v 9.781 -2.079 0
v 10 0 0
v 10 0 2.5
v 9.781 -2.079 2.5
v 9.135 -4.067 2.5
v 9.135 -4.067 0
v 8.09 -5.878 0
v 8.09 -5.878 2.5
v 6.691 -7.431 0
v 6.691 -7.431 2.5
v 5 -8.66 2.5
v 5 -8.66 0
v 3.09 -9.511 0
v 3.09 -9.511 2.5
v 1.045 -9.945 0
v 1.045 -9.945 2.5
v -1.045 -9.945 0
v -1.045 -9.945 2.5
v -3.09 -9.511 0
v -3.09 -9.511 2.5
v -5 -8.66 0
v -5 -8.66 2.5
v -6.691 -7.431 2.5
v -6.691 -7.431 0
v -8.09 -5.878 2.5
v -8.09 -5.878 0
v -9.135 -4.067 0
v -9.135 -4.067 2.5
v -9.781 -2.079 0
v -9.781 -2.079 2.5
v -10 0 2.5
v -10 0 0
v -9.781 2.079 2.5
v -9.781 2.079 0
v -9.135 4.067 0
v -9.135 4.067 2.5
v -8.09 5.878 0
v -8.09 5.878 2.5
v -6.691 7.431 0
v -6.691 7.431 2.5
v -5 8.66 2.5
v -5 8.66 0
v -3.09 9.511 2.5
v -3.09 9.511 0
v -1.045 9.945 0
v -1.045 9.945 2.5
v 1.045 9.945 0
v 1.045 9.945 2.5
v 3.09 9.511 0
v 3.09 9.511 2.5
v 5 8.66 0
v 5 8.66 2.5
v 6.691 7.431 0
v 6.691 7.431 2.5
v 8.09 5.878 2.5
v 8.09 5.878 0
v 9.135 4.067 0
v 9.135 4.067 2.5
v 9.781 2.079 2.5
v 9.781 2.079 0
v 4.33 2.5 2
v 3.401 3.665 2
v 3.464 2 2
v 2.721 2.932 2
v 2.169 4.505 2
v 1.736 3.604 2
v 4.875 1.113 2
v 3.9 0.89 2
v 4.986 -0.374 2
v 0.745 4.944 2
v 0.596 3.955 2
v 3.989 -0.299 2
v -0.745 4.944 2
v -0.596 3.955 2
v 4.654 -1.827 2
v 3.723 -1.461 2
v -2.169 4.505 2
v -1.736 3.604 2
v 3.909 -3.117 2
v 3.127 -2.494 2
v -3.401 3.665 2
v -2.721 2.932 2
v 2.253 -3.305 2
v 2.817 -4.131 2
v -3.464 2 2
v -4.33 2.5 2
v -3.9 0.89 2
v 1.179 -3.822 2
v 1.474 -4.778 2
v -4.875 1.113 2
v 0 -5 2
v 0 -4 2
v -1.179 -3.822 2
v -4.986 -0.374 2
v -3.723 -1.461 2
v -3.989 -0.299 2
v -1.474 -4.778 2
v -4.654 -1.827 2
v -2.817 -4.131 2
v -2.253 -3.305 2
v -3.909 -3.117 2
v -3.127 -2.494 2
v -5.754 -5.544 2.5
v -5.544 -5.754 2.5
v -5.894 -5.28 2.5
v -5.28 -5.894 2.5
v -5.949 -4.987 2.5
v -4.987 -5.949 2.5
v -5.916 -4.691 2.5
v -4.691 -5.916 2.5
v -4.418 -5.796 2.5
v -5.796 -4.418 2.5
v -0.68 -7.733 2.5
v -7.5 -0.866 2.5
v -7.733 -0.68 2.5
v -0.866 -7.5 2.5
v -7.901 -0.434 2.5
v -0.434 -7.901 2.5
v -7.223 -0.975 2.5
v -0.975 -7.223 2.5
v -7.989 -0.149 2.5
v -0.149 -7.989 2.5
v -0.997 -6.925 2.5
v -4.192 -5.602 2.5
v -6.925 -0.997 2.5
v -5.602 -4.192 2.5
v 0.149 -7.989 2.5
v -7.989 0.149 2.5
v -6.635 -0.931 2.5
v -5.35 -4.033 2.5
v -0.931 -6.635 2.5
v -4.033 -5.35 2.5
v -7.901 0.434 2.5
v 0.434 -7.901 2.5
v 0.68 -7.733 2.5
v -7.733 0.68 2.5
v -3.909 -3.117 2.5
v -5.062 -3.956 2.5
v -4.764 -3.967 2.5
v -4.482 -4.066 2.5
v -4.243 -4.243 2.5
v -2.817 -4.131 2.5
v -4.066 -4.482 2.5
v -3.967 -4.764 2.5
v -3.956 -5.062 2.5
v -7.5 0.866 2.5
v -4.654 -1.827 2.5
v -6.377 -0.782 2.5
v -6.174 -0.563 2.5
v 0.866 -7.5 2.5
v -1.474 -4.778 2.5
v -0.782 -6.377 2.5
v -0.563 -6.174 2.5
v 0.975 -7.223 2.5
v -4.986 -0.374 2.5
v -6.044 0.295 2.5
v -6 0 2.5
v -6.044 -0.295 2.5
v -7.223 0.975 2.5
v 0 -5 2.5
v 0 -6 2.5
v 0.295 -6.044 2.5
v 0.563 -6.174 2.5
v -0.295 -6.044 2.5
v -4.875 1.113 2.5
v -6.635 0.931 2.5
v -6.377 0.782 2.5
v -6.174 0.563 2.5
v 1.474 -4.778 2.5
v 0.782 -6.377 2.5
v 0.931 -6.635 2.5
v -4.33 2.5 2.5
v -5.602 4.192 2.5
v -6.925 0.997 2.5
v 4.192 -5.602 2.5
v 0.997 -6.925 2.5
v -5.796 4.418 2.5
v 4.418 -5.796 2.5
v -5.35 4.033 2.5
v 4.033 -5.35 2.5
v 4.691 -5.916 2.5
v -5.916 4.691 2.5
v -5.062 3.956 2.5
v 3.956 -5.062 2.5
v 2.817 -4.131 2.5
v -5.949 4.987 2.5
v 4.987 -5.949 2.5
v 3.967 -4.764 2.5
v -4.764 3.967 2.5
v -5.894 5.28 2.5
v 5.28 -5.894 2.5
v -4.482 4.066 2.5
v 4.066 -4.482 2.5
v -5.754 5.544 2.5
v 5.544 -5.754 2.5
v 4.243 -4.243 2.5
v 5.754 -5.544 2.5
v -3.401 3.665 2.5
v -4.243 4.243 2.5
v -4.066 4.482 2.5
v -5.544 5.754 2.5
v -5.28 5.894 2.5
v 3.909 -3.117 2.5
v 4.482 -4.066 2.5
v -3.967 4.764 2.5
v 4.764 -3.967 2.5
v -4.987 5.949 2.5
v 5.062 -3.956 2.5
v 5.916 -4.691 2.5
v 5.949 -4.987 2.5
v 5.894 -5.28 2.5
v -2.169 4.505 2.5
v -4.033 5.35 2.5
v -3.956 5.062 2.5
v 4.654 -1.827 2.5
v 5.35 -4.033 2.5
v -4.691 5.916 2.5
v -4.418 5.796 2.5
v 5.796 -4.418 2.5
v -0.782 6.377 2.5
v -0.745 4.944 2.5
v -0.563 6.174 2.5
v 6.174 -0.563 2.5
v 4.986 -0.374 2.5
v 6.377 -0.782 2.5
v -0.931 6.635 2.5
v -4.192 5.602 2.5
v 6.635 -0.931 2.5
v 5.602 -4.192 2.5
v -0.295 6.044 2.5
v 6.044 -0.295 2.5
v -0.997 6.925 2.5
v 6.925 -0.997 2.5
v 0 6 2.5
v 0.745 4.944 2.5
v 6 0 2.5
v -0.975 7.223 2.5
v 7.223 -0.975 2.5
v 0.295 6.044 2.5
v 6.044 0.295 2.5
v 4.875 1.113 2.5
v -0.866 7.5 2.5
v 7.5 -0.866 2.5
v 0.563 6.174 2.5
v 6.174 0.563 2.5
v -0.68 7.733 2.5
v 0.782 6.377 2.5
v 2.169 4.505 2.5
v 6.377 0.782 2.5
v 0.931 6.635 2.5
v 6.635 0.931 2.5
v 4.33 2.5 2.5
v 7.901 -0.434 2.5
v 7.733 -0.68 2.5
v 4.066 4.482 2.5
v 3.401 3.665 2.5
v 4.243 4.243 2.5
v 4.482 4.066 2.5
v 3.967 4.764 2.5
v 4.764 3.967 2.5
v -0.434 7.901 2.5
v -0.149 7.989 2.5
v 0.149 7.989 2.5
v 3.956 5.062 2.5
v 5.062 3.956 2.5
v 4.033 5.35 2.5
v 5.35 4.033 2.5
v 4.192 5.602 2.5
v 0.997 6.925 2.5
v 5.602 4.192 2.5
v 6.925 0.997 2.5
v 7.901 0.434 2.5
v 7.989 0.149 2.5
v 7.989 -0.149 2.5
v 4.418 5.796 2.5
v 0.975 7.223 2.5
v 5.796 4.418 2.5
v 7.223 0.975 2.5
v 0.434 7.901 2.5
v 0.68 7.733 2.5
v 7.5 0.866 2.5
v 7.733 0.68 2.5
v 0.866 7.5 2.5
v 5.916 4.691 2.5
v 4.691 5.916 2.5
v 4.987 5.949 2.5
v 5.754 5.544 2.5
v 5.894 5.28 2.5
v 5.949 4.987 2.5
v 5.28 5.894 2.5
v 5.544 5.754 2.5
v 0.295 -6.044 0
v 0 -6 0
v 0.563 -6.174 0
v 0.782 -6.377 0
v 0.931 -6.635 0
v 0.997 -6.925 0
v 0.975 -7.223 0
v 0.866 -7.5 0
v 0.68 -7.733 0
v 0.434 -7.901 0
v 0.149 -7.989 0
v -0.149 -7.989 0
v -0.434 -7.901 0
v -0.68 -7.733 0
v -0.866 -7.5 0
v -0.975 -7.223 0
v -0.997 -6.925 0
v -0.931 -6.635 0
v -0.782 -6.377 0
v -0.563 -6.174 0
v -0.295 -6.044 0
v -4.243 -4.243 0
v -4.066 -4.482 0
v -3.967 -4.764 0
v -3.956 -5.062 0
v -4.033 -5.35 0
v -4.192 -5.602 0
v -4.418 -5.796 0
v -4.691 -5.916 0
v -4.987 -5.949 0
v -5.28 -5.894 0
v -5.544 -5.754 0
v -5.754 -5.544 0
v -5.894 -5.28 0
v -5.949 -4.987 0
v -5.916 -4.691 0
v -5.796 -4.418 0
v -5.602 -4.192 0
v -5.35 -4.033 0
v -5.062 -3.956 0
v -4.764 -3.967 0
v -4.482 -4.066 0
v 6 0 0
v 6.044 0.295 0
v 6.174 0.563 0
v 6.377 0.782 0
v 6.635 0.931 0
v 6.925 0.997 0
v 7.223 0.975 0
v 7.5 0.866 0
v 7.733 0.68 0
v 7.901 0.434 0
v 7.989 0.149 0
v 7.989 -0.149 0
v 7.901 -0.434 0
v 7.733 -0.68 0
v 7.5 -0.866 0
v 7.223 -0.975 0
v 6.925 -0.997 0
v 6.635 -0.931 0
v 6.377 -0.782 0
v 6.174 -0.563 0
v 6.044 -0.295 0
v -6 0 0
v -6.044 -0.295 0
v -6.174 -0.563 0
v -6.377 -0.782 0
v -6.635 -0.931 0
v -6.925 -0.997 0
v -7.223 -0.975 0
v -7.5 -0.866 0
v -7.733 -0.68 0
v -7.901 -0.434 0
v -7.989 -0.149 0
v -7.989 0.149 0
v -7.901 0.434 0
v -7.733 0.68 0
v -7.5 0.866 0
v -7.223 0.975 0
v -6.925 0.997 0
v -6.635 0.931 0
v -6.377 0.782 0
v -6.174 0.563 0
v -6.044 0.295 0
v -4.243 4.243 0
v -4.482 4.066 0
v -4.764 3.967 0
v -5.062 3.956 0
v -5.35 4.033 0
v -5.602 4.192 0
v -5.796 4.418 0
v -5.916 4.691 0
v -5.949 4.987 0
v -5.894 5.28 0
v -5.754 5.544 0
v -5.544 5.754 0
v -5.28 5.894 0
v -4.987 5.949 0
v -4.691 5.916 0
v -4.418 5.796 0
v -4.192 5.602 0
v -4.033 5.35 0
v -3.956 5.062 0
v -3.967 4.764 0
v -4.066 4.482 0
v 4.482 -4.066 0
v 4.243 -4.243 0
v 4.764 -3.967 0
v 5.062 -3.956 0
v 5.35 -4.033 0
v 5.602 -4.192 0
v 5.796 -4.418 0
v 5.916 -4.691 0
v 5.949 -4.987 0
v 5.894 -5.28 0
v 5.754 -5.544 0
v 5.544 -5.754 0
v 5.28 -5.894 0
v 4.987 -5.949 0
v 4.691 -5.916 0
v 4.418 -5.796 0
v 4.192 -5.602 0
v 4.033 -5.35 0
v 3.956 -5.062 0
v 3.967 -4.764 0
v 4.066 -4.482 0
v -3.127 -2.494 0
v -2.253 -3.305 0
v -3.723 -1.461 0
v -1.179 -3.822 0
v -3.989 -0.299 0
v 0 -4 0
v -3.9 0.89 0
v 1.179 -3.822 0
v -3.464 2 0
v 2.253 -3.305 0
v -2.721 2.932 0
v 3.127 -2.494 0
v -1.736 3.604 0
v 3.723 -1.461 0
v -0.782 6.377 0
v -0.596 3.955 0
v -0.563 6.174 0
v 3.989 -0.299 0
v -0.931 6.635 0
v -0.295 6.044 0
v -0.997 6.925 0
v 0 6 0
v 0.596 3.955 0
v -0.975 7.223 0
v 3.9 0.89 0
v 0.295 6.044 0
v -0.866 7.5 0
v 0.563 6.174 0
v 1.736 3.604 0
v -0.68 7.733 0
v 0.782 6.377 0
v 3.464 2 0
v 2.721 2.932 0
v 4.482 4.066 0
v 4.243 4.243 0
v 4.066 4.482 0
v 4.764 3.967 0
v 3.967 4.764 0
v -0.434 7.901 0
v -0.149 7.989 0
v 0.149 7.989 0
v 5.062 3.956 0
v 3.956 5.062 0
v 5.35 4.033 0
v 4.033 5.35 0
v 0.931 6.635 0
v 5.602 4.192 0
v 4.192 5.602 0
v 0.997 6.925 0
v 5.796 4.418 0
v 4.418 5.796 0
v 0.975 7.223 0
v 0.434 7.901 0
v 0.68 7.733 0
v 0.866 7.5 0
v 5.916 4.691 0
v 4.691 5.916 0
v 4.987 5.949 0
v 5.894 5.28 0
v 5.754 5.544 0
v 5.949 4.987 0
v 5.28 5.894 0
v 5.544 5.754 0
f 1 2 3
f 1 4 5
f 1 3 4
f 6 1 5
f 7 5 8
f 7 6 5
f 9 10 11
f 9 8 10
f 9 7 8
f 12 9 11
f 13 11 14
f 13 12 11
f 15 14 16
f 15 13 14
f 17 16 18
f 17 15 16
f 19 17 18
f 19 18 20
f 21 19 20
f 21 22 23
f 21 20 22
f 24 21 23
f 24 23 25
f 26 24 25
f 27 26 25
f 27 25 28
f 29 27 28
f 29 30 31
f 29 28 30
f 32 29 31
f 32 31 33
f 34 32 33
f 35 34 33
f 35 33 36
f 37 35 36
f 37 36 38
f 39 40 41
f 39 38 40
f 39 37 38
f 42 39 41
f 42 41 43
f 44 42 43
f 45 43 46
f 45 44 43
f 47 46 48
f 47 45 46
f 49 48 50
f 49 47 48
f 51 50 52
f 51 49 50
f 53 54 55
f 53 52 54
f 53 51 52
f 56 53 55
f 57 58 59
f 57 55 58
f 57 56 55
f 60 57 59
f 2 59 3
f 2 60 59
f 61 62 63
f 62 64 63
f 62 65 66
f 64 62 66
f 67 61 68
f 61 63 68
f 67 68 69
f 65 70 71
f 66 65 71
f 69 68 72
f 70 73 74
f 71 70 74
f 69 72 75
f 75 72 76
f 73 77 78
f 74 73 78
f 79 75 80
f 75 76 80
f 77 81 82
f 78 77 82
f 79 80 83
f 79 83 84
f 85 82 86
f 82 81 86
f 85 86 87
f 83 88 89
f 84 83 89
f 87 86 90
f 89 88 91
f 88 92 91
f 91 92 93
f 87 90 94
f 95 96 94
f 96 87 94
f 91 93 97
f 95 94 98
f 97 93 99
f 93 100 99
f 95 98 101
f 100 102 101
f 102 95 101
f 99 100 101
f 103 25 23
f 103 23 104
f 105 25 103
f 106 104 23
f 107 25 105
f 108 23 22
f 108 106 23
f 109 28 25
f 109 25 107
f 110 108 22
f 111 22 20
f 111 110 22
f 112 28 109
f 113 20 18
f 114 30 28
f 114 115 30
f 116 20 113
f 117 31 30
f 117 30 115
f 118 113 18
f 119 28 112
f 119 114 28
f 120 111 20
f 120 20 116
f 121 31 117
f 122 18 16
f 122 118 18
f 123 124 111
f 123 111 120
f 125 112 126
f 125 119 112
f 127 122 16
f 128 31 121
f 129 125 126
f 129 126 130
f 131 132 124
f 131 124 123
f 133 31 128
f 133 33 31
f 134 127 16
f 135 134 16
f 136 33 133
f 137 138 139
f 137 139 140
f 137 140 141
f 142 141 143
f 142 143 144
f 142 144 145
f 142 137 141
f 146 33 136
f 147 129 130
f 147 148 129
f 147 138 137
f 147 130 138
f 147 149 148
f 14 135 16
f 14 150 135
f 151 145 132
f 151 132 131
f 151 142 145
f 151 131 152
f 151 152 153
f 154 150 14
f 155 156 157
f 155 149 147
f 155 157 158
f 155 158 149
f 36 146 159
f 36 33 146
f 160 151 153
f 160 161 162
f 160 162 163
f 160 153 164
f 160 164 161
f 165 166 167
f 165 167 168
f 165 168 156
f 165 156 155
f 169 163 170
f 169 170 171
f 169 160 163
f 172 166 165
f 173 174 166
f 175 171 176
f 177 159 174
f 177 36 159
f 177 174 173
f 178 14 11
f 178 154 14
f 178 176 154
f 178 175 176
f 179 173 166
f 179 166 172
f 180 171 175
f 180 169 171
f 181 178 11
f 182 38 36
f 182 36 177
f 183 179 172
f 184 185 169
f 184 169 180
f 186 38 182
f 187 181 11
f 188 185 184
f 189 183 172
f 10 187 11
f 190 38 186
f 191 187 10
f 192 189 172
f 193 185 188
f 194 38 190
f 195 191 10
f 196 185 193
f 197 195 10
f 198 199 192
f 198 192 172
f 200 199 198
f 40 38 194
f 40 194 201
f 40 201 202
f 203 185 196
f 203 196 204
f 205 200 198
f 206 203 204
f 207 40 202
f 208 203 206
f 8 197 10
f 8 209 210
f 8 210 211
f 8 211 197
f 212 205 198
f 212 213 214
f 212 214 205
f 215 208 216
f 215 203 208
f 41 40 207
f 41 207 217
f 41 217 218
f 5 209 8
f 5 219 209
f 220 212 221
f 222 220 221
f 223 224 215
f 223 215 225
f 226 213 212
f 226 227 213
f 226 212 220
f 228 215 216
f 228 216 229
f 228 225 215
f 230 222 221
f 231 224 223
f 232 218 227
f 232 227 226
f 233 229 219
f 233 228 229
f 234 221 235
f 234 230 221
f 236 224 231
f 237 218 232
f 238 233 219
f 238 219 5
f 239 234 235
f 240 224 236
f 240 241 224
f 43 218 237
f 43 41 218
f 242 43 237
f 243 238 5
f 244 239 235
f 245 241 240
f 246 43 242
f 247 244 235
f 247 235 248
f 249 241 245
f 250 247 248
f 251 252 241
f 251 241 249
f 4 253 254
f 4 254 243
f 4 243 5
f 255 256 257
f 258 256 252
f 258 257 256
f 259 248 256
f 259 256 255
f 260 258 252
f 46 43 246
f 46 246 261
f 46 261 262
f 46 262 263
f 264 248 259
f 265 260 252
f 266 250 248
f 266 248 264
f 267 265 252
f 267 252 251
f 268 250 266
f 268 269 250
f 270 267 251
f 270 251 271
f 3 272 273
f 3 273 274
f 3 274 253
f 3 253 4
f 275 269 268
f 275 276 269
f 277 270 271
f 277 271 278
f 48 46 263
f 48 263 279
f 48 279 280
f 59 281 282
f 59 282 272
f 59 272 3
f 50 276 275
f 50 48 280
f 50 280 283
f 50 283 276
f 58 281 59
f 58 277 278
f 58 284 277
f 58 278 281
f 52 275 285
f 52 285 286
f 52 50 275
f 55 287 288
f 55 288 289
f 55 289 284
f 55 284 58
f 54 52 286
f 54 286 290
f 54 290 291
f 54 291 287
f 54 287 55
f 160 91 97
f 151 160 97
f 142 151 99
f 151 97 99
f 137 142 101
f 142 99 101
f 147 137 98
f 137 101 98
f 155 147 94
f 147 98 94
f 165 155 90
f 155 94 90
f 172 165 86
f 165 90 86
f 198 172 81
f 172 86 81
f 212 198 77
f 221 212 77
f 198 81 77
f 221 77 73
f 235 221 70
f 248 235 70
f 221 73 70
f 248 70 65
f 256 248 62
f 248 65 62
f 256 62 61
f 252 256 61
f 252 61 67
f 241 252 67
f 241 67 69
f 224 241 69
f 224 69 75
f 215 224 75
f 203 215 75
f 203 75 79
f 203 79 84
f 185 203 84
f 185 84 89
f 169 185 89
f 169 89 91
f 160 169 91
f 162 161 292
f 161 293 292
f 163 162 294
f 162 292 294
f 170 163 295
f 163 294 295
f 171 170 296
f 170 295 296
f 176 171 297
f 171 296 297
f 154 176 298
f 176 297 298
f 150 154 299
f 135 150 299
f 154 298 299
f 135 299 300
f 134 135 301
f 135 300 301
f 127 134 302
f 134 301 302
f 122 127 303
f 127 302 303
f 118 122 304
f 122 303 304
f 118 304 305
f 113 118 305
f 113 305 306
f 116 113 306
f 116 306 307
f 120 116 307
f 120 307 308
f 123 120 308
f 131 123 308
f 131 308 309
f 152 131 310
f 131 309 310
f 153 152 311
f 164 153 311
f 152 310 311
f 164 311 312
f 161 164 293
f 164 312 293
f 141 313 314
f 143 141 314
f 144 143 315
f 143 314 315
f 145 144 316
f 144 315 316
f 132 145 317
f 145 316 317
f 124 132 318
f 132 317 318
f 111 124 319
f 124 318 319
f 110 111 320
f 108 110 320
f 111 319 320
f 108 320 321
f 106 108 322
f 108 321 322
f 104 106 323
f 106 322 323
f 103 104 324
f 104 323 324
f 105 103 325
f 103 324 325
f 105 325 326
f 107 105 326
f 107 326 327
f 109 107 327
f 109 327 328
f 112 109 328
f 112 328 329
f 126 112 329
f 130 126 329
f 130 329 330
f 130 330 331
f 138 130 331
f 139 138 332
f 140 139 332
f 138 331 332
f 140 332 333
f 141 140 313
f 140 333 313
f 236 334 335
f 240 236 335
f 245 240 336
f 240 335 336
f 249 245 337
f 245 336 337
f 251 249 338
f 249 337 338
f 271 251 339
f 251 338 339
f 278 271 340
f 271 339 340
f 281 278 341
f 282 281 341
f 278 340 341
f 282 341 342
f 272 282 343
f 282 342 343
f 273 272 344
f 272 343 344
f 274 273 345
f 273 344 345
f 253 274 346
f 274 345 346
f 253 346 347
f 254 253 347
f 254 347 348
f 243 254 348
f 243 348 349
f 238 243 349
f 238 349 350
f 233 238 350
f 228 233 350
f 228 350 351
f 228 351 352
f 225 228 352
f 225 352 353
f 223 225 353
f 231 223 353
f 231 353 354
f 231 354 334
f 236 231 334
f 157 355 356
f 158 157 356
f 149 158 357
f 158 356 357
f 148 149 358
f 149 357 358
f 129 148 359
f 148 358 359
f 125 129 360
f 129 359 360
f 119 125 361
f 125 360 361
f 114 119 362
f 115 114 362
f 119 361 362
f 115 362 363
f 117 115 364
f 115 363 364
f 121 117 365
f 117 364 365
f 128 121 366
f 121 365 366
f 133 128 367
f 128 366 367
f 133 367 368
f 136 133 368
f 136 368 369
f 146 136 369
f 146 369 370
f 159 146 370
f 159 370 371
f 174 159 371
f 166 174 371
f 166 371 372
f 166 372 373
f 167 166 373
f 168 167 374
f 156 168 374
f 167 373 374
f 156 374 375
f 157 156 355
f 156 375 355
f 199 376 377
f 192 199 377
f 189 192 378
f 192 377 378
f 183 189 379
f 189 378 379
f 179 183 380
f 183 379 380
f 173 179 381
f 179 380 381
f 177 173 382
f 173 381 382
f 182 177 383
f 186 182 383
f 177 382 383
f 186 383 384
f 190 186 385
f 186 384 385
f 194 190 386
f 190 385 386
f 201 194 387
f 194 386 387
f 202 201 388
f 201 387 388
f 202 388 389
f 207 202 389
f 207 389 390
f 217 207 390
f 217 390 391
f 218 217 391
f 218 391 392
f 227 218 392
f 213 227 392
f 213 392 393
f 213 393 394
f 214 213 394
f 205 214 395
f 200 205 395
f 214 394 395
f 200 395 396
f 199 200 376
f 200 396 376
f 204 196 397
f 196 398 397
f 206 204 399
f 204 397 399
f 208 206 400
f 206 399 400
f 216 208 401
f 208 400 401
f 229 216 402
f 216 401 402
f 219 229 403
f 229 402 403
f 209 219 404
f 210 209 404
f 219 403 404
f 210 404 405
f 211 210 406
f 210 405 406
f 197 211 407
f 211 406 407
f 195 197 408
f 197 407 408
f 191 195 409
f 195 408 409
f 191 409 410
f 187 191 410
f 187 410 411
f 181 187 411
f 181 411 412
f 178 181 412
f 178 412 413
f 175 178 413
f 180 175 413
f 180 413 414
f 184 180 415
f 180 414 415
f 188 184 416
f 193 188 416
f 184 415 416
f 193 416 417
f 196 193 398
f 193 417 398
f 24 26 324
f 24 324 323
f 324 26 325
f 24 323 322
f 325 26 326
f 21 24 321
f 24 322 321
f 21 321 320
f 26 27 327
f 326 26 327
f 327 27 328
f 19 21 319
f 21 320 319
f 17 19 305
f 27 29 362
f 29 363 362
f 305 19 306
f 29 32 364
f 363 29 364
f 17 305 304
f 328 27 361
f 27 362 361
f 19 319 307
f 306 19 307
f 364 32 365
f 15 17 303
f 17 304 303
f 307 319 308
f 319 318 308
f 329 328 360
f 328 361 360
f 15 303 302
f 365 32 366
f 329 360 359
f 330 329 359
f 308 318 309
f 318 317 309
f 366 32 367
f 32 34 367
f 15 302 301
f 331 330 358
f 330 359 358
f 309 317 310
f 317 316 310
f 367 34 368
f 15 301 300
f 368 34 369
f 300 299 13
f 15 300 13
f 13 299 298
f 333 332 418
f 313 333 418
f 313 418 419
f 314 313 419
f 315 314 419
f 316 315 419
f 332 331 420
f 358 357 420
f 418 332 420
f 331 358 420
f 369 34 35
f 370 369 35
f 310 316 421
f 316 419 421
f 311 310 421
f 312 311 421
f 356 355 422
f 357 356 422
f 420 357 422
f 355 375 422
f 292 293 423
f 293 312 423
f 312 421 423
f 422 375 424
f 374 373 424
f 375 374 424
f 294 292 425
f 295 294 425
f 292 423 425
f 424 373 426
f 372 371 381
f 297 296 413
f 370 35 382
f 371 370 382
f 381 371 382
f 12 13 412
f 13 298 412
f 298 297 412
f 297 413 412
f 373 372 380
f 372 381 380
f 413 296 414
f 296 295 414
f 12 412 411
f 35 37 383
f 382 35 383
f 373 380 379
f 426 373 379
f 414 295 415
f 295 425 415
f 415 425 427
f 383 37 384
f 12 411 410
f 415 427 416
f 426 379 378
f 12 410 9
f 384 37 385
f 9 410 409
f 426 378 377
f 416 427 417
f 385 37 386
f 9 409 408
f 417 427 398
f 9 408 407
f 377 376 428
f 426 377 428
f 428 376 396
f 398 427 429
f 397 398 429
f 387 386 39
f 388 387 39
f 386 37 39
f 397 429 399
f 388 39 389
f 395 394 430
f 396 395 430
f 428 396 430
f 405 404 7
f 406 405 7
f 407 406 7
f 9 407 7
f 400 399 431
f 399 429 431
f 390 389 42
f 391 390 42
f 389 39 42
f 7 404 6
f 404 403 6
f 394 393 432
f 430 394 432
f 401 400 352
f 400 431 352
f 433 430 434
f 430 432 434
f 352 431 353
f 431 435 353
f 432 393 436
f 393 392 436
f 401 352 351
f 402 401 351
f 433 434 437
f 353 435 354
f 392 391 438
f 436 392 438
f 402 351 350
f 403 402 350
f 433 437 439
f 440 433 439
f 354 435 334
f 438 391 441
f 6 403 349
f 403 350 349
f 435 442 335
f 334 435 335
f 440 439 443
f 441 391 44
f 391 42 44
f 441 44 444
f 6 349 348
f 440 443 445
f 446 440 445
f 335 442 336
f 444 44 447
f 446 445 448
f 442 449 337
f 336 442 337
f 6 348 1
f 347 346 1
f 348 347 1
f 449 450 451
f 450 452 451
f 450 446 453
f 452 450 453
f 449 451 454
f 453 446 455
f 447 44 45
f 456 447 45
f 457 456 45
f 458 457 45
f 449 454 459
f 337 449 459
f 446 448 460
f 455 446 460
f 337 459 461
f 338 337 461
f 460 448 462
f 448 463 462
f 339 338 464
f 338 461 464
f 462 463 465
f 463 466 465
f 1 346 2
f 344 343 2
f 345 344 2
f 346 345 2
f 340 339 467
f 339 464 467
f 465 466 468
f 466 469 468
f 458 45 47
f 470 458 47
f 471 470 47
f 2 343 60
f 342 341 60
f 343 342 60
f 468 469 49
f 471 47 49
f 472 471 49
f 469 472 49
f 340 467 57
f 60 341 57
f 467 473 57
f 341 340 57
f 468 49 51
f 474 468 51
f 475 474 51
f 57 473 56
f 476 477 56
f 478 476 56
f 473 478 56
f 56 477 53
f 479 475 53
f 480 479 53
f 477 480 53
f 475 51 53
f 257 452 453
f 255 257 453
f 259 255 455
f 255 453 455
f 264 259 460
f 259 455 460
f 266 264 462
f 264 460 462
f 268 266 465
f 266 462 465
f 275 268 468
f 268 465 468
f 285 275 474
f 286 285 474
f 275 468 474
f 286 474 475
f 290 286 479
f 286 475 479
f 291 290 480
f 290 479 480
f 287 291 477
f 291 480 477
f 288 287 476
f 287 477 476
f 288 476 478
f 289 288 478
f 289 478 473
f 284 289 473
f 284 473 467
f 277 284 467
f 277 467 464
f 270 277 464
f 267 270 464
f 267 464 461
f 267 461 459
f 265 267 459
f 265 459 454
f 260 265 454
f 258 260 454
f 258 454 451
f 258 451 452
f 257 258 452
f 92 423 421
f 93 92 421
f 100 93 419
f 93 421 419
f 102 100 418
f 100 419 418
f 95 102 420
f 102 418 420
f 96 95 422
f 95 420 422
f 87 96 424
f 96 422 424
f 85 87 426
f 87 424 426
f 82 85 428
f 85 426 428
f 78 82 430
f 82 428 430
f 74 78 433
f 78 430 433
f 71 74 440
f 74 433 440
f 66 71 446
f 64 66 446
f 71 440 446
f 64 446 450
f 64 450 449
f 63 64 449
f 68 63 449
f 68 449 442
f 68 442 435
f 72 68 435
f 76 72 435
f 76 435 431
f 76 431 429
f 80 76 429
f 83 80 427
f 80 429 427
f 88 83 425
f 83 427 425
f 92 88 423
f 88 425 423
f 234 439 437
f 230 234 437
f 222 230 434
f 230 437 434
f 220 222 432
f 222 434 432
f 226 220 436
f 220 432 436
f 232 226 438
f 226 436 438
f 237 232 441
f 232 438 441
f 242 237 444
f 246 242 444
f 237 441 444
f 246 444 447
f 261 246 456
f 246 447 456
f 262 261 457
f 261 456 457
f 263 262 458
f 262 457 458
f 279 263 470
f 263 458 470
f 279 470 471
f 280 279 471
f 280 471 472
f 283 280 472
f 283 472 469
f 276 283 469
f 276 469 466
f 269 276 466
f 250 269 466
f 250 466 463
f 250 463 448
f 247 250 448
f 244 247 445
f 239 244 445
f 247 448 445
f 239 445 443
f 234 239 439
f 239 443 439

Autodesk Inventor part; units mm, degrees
ref_plane "YZ Plane" through (0, 0, 0) normal (1, 0, 0) x (0, 1, 0)
ref_plane "XZ Plane" through (0, 0, 0) normal (0, 1, 0) x (-1, 0, 0)
ref_plane "XY Plane" through (0, 0, 0) normal (0, 0, 1) x (1, 0, 0)
sketch "スケッチ1" plane through (0, 0, 0) normal (0, 0, 1) x (1, 0, 0)
  circle A0 centre (0, 0) radius 10
  dimension "d0" = 20
extrude "押し出し1" add sketch "スケッチ1" along normal blind 2.5
sketch "スケッチ2" plane through (0, 0, 2.5) normal (0, 0, 1) x (1, 0, 0)
  circle A0 centre (0, 0) radius 10 projected
  circle A1 centre (0, 0) radius 5
  dimension "d3" = 10
hole "穴2" at (0, 0, 2.5) direction (0, 0, -1) diameter 10 depth 0.5
sketch "スケッチ4" plane through (0, 0, 2) normal (0, 0, 1) x (1, 0, 0)
  circle A0 centre (0, 0) radius 5 projected
  circle A1 centre (0, 0) radius 4
  dimension "d21" = 8
hole "穴3" at (0, 0, 2) direction (0, 0, -1) diameter 8 end through all
sketch "スケッチ5" plane through (0, 0, 2.5) normal (0, 0, 1) x (1, 0, 0)
  circle A0 centre (0, 0) radius 5 projected
  circle A1 centre (0, 7) radius 1
  dimension "d29" = 7
  dimension "d30" = 2
hole "穴4" at (0, 7, 2.5) direction (0, 0, -1) diameter 2 end through all
pattern_circular "円形状パターン1" count 8 over 360 about axis through (0, 0, 2.25) along (0, 0, 1) of "穴4"
thread "ねじ1" size "M2x0.4" class "6H" standard "ANSI Metric M Profile" full length
thread "ねじ2" size "M2x0.4" class "6H" standard "ANSI Metric M Profile" full length
thread "ねじ3" size "M2x0.4" class "6H" standard "ANSI Metric M Profile" full length
thread "ねじ4" size "M2x0.4" class "6H" standard "ANSI Metric M Profile" full length
thread "ねじ5" size "M2x0.4" class "6H" standard "ANSI Metric M Profile" full length
thread "ねじ6" size "M2x0.4" class "6H" standard "ANSI Metric M Profile" full length
thread "ねじ7" size "M2x0.4" class "6H" standard "ANSI Metric M Profile" full length
thread "ねじ8" size "M2x0.4" class "6H" standard "ANSI Metric M Profile" full length
properties part number "03" material "アルミニウム 6061"
